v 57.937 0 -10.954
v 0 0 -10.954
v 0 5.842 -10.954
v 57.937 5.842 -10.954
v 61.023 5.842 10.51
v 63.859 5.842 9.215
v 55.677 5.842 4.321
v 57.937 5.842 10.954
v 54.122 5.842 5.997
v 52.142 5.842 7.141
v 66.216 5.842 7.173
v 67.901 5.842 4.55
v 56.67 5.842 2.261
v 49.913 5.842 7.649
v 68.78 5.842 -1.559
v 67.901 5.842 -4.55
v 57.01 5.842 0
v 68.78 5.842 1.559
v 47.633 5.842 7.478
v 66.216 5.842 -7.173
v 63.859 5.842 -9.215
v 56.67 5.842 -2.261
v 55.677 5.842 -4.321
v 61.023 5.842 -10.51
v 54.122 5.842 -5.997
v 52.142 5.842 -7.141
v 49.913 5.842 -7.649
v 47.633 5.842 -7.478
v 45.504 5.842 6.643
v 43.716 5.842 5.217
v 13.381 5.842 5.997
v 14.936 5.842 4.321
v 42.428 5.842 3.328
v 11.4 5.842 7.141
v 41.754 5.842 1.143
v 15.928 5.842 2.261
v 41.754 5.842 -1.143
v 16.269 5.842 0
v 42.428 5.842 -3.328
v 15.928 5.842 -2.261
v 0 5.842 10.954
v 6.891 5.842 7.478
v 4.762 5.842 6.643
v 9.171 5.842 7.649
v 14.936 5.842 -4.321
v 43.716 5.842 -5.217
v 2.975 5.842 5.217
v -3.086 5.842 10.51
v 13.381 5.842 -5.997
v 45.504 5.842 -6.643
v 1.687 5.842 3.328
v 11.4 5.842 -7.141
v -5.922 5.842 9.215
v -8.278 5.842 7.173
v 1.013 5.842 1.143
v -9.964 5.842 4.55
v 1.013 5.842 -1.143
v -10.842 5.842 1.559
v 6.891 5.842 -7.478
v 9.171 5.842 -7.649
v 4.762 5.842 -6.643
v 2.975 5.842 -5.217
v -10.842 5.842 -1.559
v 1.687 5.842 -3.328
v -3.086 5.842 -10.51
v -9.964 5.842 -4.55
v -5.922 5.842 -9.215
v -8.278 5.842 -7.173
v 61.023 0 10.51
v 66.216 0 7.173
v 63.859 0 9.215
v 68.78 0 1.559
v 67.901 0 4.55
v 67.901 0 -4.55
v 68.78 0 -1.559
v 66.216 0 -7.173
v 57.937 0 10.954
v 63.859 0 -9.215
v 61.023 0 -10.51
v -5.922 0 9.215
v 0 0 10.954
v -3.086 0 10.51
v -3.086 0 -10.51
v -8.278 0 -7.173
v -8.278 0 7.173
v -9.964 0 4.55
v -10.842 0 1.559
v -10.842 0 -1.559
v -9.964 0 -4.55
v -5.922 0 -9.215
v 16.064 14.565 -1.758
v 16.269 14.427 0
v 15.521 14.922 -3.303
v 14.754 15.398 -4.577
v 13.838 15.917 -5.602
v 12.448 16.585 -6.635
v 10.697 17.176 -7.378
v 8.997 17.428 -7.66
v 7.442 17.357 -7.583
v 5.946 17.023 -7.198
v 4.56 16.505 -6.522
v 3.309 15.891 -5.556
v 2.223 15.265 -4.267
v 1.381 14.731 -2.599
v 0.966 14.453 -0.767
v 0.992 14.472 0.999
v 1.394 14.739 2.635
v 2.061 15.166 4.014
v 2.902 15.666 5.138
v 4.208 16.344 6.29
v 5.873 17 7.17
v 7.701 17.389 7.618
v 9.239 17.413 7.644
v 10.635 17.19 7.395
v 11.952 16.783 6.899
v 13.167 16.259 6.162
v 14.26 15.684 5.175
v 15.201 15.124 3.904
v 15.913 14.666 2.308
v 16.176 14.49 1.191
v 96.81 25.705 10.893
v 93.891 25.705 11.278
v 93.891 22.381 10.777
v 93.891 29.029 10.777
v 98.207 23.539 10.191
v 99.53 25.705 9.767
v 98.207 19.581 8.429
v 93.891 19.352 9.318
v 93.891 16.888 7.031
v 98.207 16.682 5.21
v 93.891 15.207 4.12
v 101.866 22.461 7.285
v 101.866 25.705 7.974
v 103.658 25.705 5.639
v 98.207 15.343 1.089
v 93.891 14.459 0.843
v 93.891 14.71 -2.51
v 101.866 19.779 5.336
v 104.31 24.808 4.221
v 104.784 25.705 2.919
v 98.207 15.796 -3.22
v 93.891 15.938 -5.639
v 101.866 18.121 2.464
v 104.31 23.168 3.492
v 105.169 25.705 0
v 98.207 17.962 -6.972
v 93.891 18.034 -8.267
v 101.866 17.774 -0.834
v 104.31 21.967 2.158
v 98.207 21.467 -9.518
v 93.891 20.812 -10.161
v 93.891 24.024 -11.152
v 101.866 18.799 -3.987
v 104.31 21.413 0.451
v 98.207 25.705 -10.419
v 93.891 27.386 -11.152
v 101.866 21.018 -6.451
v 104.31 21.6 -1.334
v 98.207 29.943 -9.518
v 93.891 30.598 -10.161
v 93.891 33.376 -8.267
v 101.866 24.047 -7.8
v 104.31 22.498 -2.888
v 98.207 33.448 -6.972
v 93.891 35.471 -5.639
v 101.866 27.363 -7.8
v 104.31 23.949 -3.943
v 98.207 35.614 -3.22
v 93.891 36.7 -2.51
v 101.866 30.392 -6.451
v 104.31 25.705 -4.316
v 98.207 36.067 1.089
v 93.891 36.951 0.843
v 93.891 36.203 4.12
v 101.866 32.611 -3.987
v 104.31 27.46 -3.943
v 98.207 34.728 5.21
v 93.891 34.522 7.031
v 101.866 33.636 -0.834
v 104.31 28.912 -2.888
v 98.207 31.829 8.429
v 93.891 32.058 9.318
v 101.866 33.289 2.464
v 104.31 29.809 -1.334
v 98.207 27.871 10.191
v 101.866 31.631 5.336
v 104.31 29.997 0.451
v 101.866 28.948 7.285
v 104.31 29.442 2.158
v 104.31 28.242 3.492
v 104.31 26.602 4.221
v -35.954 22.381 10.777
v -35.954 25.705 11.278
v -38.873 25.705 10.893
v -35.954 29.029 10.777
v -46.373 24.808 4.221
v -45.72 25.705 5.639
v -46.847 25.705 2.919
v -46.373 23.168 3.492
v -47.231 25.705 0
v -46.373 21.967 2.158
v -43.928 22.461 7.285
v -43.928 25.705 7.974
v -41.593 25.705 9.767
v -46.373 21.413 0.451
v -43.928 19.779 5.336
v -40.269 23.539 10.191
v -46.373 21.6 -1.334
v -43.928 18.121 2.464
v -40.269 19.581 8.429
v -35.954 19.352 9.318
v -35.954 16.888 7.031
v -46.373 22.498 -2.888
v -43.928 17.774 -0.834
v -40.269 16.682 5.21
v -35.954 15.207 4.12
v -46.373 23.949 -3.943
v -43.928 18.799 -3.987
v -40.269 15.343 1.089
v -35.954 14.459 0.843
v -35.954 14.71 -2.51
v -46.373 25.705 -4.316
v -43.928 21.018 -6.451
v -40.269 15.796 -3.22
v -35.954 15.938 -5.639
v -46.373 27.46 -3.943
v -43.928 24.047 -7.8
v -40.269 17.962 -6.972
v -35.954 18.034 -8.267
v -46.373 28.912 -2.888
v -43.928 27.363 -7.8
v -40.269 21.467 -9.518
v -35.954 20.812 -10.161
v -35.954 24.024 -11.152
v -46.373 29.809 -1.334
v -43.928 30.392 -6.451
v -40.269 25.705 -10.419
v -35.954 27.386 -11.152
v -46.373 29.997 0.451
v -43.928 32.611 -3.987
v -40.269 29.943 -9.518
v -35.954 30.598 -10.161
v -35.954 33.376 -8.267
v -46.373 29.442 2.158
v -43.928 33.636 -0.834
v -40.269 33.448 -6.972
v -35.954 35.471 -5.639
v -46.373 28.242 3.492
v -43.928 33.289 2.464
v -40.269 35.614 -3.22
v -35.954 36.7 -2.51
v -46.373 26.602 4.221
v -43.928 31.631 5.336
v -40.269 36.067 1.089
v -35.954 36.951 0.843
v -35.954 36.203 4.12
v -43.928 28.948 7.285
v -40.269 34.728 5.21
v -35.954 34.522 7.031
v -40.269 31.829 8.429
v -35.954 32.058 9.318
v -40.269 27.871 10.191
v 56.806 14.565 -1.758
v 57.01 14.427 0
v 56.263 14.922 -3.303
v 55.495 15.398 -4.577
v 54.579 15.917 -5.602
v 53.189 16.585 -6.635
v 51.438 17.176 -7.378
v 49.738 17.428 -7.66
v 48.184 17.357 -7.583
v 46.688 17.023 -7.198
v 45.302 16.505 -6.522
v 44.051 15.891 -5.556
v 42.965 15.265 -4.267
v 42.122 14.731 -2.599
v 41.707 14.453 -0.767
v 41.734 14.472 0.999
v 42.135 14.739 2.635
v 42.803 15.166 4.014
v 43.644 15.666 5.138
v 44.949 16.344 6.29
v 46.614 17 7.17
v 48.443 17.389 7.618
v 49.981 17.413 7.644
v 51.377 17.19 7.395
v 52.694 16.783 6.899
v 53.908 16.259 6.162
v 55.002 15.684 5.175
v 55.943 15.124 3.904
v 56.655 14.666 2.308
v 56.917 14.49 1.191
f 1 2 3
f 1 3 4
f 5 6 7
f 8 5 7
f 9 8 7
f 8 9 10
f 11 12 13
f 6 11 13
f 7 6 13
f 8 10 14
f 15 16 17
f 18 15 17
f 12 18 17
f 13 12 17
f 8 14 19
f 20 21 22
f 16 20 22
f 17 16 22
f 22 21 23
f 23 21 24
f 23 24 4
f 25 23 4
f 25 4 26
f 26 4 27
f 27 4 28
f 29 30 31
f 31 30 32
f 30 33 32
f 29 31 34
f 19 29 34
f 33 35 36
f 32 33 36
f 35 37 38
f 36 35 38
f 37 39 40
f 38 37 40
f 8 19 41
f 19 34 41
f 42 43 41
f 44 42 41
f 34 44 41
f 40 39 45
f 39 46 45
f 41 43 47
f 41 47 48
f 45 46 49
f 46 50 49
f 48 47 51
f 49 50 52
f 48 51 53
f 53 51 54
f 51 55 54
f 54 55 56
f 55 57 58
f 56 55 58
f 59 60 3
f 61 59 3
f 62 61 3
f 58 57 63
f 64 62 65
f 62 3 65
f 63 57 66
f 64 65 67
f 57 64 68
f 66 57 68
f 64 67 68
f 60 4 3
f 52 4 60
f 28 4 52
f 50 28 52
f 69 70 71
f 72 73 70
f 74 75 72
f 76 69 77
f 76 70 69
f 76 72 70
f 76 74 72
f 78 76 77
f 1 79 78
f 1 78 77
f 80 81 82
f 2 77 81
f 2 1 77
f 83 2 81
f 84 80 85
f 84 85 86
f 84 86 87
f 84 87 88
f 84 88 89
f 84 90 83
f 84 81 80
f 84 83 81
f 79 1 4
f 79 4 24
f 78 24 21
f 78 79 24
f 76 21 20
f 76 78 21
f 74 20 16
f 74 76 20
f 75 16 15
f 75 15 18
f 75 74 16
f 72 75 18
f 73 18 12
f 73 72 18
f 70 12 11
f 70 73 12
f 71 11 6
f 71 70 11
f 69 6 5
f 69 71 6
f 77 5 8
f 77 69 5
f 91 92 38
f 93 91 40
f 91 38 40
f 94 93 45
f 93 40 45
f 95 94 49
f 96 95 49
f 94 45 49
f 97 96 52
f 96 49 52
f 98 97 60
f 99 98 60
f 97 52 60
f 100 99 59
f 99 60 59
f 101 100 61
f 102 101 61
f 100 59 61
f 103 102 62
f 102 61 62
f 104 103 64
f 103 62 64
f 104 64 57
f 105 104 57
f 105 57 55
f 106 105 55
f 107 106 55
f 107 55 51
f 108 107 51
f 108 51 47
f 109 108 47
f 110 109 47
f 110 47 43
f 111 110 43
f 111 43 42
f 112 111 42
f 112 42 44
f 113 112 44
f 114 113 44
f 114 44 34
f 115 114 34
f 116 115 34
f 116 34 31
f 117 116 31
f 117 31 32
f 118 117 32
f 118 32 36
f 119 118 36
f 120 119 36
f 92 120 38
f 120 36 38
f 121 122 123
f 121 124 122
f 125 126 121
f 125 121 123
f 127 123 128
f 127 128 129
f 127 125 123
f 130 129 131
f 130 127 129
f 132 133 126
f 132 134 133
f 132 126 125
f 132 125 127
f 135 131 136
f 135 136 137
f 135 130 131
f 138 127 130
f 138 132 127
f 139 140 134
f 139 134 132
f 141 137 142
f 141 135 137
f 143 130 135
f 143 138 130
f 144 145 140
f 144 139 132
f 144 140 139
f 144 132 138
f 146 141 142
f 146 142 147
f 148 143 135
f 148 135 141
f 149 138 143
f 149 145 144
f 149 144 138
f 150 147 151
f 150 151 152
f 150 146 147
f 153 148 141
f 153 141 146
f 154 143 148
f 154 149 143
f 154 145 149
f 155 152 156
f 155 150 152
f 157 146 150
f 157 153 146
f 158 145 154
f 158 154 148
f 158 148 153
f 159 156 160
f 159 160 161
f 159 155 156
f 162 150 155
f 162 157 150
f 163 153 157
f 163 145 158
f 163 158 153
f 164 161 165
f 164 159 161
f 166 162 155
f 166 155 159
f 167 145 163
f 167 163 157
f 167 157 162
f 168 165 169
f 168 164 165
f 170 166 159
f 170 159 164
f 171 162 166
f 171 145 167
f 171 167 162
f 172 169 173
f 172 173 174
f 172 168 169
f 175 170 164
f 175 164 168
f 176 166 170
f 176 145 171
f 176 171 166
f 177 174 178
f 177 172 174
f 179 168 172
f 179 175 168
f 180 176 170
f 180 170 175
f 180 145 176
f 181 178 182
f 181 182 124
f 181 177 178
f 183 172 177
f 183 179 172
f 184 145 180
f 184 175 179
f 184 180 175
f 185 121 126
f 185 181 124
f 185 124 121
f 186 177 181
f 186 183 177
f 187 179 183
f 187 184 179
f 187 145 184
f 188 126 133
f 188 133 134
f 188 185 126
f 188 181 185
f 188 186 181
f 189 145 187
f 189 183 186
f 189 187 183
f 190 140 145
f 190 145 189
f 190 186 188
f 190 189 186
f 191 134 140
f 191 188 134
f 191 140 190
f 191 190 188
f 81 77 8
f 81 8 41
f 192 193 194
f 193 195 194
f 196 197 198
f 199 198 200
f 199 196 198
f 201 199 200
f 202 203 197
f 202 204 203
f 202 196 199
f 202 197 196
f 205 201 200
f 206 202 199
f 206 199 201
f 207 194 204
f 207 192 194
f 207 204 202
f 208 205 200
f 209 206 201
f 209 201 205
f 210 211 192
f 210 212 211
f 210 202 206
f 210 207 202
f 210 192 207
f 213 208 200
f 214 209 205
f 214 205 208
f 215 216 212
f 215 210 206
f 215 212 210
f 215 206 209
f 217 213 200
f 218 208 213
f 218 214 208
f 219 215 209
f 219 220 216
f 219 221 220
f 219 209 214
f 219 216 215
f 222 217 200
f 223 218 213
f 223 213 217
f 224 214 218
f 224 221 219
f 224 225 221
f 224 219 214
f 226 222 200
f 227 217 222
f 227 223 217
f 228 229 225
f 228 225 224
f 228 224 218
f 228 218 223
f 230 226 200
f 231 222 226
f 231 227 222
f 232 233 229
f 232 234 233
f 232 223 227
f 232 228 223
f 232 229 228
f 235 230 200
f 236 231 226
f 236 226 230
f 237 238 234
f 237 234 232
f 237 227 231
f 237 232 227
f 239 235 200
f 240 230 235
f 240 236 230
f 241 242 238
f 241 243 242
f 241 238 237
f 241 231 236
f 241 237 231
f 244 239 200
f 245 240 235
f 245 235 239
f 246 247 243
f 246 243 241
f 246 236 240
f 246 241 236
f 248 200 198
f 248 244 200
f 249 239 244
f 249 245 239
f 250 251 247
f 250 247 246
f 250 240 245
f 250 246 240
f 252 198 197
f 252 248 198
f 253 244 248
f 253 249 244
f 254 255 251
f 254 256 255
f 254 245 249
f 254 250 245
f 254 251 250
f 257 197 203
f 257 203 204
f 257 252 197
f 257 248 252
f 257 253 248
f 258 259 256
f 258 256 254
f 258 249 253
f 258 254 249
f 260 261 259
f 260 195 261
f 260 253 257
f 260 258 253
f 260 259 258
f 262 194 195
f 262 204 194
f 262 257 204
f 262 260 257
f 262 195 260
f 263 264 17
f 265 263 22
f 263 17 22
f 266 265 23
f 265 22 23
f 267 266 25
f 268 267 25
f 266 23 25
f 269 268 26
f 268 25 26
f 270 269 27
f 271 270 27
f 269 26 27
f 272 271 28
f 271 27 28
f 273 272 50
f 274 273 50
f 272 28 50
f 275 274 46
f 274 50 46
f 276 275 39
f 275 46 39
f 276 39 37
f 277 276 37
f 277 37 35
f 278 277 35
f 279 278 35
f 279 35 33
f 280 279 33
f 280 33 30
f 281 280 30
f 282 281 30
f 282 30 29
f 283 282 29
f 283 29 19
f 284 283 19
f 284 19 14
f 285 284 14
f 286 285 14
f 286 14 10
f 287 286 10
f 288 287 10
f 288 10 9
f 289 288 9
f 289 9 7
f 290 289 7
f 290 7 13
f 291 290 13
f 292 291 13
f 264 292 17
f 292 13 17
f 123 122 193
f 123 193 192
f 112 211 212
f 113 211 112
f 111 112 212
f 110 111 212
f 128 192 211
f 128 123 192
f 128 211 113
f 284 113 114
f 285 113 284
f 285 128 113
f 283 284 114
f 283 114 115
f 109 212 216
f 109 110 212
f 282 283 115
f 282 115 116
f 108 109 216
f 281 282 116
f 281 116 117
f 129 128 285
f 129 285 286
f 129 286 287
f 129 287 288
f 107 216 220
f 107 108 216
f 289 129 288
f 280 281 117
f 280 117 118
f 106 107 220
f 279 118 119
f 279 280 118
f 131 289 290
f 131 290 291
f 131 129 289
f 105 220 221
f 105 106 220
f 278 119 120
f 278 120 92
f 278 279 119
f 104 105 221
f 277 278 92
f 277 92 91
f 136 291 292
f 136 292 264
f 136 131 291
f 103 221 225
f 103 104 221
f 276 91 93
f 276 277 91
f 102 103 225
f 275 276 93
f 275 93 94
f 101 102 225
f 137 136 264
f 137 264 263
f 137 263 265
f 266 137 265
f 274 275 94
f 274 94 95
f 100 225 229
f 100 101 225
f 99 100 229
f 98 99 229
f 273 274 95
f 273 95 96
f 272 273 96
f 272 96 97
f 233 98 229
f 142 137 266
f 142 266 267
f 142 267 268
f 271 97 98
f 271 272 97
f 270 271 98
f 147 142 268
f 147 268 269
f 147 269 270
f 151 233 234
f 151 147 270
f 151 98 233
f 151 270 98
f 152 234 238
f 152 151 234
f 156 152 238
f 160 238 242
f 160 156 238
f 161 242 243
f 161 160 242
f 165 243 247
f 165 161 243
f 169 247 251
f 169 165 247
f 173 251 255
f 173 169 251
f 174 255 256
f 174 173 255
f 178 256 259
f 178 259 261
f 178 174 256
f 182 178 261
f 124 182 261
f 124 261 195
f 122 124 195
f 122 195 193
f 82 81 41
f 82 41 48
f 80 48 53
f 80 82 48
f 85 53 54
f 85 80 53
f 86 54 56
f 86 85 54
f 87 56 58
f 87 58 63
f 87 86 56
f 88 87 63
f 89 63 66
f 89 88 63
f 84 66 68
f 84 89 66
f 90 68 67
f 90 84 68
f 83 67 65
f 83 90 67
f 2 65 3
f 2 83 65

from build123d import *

# Parameters (mm, degrees)
BOSS_EXTRUDE1_DEPTH = 5.842
SKETCH2_R           = 7.6708
BOSS_EXTRUDE2_DEPTH = 14.224


with BuildPart() as part:
    # Sketch1 → Boss-Extrude1 (new body)
    with BuildSketch(Plane(origin=(0, 0, 0), x_dir=(1, 0, 0), z_dir=(0, 1, 0))):
        with BuildLine():
            Line((0, 10.95375), (57.9374, 10.95375))
            ThreePointArc((57.9374, 10.95375), (68.89115, 0), (57.9374, -10.95375))
            Line((57.9374, -10.95375), (0, -10.95375))
            ThreePointArc((0, -10.95375), (-10.95375, 0), (0, 10.95375))
        make_face()
    extrude(amount=BOSS_EXTRUDE1_DEPTH)

    # Sketch2 → Boss-Extrude2 (add)
    with BuildSketch(Plane(origin=(0, 5.842, 0), x_dir=(1, 0, 0), z_dir=(0, 1, 0))):
        with Locations((8.5979, 0)):
            Circle(SKETCH2_R)
        with Locations((49.3395, 0)):
            Circle(SKETCH2_R)
    extrude(amount=BOSS_EXTRUDE2_DEPTH)

    # Sketch3 → Revolve6 (revolve)
    with BuildSketch(Plane(origin=(0, 25.7048, 0), x_dir=(1, 0, 0), z_dir=(0, 1, 0))):
        with BuildLine():
            Line((-35.9537, -11.2776), (93.8911, -11.2776))
            ThreePointArc((93.8911, -11.2776), (101.865567436, -7.974467436), (105.1687, 0))
            Line((105.1687, 0), (-47.2313, 0))
            ThreePointArc((-47.2313, 0), (-43.928167436, -7.974467436), (-35.9537, -11.2776))
        make_face()
    revolve(axis=Axis((-35.9537, 25.7048, 0), (1, 0, 0)))


solid = part.part
